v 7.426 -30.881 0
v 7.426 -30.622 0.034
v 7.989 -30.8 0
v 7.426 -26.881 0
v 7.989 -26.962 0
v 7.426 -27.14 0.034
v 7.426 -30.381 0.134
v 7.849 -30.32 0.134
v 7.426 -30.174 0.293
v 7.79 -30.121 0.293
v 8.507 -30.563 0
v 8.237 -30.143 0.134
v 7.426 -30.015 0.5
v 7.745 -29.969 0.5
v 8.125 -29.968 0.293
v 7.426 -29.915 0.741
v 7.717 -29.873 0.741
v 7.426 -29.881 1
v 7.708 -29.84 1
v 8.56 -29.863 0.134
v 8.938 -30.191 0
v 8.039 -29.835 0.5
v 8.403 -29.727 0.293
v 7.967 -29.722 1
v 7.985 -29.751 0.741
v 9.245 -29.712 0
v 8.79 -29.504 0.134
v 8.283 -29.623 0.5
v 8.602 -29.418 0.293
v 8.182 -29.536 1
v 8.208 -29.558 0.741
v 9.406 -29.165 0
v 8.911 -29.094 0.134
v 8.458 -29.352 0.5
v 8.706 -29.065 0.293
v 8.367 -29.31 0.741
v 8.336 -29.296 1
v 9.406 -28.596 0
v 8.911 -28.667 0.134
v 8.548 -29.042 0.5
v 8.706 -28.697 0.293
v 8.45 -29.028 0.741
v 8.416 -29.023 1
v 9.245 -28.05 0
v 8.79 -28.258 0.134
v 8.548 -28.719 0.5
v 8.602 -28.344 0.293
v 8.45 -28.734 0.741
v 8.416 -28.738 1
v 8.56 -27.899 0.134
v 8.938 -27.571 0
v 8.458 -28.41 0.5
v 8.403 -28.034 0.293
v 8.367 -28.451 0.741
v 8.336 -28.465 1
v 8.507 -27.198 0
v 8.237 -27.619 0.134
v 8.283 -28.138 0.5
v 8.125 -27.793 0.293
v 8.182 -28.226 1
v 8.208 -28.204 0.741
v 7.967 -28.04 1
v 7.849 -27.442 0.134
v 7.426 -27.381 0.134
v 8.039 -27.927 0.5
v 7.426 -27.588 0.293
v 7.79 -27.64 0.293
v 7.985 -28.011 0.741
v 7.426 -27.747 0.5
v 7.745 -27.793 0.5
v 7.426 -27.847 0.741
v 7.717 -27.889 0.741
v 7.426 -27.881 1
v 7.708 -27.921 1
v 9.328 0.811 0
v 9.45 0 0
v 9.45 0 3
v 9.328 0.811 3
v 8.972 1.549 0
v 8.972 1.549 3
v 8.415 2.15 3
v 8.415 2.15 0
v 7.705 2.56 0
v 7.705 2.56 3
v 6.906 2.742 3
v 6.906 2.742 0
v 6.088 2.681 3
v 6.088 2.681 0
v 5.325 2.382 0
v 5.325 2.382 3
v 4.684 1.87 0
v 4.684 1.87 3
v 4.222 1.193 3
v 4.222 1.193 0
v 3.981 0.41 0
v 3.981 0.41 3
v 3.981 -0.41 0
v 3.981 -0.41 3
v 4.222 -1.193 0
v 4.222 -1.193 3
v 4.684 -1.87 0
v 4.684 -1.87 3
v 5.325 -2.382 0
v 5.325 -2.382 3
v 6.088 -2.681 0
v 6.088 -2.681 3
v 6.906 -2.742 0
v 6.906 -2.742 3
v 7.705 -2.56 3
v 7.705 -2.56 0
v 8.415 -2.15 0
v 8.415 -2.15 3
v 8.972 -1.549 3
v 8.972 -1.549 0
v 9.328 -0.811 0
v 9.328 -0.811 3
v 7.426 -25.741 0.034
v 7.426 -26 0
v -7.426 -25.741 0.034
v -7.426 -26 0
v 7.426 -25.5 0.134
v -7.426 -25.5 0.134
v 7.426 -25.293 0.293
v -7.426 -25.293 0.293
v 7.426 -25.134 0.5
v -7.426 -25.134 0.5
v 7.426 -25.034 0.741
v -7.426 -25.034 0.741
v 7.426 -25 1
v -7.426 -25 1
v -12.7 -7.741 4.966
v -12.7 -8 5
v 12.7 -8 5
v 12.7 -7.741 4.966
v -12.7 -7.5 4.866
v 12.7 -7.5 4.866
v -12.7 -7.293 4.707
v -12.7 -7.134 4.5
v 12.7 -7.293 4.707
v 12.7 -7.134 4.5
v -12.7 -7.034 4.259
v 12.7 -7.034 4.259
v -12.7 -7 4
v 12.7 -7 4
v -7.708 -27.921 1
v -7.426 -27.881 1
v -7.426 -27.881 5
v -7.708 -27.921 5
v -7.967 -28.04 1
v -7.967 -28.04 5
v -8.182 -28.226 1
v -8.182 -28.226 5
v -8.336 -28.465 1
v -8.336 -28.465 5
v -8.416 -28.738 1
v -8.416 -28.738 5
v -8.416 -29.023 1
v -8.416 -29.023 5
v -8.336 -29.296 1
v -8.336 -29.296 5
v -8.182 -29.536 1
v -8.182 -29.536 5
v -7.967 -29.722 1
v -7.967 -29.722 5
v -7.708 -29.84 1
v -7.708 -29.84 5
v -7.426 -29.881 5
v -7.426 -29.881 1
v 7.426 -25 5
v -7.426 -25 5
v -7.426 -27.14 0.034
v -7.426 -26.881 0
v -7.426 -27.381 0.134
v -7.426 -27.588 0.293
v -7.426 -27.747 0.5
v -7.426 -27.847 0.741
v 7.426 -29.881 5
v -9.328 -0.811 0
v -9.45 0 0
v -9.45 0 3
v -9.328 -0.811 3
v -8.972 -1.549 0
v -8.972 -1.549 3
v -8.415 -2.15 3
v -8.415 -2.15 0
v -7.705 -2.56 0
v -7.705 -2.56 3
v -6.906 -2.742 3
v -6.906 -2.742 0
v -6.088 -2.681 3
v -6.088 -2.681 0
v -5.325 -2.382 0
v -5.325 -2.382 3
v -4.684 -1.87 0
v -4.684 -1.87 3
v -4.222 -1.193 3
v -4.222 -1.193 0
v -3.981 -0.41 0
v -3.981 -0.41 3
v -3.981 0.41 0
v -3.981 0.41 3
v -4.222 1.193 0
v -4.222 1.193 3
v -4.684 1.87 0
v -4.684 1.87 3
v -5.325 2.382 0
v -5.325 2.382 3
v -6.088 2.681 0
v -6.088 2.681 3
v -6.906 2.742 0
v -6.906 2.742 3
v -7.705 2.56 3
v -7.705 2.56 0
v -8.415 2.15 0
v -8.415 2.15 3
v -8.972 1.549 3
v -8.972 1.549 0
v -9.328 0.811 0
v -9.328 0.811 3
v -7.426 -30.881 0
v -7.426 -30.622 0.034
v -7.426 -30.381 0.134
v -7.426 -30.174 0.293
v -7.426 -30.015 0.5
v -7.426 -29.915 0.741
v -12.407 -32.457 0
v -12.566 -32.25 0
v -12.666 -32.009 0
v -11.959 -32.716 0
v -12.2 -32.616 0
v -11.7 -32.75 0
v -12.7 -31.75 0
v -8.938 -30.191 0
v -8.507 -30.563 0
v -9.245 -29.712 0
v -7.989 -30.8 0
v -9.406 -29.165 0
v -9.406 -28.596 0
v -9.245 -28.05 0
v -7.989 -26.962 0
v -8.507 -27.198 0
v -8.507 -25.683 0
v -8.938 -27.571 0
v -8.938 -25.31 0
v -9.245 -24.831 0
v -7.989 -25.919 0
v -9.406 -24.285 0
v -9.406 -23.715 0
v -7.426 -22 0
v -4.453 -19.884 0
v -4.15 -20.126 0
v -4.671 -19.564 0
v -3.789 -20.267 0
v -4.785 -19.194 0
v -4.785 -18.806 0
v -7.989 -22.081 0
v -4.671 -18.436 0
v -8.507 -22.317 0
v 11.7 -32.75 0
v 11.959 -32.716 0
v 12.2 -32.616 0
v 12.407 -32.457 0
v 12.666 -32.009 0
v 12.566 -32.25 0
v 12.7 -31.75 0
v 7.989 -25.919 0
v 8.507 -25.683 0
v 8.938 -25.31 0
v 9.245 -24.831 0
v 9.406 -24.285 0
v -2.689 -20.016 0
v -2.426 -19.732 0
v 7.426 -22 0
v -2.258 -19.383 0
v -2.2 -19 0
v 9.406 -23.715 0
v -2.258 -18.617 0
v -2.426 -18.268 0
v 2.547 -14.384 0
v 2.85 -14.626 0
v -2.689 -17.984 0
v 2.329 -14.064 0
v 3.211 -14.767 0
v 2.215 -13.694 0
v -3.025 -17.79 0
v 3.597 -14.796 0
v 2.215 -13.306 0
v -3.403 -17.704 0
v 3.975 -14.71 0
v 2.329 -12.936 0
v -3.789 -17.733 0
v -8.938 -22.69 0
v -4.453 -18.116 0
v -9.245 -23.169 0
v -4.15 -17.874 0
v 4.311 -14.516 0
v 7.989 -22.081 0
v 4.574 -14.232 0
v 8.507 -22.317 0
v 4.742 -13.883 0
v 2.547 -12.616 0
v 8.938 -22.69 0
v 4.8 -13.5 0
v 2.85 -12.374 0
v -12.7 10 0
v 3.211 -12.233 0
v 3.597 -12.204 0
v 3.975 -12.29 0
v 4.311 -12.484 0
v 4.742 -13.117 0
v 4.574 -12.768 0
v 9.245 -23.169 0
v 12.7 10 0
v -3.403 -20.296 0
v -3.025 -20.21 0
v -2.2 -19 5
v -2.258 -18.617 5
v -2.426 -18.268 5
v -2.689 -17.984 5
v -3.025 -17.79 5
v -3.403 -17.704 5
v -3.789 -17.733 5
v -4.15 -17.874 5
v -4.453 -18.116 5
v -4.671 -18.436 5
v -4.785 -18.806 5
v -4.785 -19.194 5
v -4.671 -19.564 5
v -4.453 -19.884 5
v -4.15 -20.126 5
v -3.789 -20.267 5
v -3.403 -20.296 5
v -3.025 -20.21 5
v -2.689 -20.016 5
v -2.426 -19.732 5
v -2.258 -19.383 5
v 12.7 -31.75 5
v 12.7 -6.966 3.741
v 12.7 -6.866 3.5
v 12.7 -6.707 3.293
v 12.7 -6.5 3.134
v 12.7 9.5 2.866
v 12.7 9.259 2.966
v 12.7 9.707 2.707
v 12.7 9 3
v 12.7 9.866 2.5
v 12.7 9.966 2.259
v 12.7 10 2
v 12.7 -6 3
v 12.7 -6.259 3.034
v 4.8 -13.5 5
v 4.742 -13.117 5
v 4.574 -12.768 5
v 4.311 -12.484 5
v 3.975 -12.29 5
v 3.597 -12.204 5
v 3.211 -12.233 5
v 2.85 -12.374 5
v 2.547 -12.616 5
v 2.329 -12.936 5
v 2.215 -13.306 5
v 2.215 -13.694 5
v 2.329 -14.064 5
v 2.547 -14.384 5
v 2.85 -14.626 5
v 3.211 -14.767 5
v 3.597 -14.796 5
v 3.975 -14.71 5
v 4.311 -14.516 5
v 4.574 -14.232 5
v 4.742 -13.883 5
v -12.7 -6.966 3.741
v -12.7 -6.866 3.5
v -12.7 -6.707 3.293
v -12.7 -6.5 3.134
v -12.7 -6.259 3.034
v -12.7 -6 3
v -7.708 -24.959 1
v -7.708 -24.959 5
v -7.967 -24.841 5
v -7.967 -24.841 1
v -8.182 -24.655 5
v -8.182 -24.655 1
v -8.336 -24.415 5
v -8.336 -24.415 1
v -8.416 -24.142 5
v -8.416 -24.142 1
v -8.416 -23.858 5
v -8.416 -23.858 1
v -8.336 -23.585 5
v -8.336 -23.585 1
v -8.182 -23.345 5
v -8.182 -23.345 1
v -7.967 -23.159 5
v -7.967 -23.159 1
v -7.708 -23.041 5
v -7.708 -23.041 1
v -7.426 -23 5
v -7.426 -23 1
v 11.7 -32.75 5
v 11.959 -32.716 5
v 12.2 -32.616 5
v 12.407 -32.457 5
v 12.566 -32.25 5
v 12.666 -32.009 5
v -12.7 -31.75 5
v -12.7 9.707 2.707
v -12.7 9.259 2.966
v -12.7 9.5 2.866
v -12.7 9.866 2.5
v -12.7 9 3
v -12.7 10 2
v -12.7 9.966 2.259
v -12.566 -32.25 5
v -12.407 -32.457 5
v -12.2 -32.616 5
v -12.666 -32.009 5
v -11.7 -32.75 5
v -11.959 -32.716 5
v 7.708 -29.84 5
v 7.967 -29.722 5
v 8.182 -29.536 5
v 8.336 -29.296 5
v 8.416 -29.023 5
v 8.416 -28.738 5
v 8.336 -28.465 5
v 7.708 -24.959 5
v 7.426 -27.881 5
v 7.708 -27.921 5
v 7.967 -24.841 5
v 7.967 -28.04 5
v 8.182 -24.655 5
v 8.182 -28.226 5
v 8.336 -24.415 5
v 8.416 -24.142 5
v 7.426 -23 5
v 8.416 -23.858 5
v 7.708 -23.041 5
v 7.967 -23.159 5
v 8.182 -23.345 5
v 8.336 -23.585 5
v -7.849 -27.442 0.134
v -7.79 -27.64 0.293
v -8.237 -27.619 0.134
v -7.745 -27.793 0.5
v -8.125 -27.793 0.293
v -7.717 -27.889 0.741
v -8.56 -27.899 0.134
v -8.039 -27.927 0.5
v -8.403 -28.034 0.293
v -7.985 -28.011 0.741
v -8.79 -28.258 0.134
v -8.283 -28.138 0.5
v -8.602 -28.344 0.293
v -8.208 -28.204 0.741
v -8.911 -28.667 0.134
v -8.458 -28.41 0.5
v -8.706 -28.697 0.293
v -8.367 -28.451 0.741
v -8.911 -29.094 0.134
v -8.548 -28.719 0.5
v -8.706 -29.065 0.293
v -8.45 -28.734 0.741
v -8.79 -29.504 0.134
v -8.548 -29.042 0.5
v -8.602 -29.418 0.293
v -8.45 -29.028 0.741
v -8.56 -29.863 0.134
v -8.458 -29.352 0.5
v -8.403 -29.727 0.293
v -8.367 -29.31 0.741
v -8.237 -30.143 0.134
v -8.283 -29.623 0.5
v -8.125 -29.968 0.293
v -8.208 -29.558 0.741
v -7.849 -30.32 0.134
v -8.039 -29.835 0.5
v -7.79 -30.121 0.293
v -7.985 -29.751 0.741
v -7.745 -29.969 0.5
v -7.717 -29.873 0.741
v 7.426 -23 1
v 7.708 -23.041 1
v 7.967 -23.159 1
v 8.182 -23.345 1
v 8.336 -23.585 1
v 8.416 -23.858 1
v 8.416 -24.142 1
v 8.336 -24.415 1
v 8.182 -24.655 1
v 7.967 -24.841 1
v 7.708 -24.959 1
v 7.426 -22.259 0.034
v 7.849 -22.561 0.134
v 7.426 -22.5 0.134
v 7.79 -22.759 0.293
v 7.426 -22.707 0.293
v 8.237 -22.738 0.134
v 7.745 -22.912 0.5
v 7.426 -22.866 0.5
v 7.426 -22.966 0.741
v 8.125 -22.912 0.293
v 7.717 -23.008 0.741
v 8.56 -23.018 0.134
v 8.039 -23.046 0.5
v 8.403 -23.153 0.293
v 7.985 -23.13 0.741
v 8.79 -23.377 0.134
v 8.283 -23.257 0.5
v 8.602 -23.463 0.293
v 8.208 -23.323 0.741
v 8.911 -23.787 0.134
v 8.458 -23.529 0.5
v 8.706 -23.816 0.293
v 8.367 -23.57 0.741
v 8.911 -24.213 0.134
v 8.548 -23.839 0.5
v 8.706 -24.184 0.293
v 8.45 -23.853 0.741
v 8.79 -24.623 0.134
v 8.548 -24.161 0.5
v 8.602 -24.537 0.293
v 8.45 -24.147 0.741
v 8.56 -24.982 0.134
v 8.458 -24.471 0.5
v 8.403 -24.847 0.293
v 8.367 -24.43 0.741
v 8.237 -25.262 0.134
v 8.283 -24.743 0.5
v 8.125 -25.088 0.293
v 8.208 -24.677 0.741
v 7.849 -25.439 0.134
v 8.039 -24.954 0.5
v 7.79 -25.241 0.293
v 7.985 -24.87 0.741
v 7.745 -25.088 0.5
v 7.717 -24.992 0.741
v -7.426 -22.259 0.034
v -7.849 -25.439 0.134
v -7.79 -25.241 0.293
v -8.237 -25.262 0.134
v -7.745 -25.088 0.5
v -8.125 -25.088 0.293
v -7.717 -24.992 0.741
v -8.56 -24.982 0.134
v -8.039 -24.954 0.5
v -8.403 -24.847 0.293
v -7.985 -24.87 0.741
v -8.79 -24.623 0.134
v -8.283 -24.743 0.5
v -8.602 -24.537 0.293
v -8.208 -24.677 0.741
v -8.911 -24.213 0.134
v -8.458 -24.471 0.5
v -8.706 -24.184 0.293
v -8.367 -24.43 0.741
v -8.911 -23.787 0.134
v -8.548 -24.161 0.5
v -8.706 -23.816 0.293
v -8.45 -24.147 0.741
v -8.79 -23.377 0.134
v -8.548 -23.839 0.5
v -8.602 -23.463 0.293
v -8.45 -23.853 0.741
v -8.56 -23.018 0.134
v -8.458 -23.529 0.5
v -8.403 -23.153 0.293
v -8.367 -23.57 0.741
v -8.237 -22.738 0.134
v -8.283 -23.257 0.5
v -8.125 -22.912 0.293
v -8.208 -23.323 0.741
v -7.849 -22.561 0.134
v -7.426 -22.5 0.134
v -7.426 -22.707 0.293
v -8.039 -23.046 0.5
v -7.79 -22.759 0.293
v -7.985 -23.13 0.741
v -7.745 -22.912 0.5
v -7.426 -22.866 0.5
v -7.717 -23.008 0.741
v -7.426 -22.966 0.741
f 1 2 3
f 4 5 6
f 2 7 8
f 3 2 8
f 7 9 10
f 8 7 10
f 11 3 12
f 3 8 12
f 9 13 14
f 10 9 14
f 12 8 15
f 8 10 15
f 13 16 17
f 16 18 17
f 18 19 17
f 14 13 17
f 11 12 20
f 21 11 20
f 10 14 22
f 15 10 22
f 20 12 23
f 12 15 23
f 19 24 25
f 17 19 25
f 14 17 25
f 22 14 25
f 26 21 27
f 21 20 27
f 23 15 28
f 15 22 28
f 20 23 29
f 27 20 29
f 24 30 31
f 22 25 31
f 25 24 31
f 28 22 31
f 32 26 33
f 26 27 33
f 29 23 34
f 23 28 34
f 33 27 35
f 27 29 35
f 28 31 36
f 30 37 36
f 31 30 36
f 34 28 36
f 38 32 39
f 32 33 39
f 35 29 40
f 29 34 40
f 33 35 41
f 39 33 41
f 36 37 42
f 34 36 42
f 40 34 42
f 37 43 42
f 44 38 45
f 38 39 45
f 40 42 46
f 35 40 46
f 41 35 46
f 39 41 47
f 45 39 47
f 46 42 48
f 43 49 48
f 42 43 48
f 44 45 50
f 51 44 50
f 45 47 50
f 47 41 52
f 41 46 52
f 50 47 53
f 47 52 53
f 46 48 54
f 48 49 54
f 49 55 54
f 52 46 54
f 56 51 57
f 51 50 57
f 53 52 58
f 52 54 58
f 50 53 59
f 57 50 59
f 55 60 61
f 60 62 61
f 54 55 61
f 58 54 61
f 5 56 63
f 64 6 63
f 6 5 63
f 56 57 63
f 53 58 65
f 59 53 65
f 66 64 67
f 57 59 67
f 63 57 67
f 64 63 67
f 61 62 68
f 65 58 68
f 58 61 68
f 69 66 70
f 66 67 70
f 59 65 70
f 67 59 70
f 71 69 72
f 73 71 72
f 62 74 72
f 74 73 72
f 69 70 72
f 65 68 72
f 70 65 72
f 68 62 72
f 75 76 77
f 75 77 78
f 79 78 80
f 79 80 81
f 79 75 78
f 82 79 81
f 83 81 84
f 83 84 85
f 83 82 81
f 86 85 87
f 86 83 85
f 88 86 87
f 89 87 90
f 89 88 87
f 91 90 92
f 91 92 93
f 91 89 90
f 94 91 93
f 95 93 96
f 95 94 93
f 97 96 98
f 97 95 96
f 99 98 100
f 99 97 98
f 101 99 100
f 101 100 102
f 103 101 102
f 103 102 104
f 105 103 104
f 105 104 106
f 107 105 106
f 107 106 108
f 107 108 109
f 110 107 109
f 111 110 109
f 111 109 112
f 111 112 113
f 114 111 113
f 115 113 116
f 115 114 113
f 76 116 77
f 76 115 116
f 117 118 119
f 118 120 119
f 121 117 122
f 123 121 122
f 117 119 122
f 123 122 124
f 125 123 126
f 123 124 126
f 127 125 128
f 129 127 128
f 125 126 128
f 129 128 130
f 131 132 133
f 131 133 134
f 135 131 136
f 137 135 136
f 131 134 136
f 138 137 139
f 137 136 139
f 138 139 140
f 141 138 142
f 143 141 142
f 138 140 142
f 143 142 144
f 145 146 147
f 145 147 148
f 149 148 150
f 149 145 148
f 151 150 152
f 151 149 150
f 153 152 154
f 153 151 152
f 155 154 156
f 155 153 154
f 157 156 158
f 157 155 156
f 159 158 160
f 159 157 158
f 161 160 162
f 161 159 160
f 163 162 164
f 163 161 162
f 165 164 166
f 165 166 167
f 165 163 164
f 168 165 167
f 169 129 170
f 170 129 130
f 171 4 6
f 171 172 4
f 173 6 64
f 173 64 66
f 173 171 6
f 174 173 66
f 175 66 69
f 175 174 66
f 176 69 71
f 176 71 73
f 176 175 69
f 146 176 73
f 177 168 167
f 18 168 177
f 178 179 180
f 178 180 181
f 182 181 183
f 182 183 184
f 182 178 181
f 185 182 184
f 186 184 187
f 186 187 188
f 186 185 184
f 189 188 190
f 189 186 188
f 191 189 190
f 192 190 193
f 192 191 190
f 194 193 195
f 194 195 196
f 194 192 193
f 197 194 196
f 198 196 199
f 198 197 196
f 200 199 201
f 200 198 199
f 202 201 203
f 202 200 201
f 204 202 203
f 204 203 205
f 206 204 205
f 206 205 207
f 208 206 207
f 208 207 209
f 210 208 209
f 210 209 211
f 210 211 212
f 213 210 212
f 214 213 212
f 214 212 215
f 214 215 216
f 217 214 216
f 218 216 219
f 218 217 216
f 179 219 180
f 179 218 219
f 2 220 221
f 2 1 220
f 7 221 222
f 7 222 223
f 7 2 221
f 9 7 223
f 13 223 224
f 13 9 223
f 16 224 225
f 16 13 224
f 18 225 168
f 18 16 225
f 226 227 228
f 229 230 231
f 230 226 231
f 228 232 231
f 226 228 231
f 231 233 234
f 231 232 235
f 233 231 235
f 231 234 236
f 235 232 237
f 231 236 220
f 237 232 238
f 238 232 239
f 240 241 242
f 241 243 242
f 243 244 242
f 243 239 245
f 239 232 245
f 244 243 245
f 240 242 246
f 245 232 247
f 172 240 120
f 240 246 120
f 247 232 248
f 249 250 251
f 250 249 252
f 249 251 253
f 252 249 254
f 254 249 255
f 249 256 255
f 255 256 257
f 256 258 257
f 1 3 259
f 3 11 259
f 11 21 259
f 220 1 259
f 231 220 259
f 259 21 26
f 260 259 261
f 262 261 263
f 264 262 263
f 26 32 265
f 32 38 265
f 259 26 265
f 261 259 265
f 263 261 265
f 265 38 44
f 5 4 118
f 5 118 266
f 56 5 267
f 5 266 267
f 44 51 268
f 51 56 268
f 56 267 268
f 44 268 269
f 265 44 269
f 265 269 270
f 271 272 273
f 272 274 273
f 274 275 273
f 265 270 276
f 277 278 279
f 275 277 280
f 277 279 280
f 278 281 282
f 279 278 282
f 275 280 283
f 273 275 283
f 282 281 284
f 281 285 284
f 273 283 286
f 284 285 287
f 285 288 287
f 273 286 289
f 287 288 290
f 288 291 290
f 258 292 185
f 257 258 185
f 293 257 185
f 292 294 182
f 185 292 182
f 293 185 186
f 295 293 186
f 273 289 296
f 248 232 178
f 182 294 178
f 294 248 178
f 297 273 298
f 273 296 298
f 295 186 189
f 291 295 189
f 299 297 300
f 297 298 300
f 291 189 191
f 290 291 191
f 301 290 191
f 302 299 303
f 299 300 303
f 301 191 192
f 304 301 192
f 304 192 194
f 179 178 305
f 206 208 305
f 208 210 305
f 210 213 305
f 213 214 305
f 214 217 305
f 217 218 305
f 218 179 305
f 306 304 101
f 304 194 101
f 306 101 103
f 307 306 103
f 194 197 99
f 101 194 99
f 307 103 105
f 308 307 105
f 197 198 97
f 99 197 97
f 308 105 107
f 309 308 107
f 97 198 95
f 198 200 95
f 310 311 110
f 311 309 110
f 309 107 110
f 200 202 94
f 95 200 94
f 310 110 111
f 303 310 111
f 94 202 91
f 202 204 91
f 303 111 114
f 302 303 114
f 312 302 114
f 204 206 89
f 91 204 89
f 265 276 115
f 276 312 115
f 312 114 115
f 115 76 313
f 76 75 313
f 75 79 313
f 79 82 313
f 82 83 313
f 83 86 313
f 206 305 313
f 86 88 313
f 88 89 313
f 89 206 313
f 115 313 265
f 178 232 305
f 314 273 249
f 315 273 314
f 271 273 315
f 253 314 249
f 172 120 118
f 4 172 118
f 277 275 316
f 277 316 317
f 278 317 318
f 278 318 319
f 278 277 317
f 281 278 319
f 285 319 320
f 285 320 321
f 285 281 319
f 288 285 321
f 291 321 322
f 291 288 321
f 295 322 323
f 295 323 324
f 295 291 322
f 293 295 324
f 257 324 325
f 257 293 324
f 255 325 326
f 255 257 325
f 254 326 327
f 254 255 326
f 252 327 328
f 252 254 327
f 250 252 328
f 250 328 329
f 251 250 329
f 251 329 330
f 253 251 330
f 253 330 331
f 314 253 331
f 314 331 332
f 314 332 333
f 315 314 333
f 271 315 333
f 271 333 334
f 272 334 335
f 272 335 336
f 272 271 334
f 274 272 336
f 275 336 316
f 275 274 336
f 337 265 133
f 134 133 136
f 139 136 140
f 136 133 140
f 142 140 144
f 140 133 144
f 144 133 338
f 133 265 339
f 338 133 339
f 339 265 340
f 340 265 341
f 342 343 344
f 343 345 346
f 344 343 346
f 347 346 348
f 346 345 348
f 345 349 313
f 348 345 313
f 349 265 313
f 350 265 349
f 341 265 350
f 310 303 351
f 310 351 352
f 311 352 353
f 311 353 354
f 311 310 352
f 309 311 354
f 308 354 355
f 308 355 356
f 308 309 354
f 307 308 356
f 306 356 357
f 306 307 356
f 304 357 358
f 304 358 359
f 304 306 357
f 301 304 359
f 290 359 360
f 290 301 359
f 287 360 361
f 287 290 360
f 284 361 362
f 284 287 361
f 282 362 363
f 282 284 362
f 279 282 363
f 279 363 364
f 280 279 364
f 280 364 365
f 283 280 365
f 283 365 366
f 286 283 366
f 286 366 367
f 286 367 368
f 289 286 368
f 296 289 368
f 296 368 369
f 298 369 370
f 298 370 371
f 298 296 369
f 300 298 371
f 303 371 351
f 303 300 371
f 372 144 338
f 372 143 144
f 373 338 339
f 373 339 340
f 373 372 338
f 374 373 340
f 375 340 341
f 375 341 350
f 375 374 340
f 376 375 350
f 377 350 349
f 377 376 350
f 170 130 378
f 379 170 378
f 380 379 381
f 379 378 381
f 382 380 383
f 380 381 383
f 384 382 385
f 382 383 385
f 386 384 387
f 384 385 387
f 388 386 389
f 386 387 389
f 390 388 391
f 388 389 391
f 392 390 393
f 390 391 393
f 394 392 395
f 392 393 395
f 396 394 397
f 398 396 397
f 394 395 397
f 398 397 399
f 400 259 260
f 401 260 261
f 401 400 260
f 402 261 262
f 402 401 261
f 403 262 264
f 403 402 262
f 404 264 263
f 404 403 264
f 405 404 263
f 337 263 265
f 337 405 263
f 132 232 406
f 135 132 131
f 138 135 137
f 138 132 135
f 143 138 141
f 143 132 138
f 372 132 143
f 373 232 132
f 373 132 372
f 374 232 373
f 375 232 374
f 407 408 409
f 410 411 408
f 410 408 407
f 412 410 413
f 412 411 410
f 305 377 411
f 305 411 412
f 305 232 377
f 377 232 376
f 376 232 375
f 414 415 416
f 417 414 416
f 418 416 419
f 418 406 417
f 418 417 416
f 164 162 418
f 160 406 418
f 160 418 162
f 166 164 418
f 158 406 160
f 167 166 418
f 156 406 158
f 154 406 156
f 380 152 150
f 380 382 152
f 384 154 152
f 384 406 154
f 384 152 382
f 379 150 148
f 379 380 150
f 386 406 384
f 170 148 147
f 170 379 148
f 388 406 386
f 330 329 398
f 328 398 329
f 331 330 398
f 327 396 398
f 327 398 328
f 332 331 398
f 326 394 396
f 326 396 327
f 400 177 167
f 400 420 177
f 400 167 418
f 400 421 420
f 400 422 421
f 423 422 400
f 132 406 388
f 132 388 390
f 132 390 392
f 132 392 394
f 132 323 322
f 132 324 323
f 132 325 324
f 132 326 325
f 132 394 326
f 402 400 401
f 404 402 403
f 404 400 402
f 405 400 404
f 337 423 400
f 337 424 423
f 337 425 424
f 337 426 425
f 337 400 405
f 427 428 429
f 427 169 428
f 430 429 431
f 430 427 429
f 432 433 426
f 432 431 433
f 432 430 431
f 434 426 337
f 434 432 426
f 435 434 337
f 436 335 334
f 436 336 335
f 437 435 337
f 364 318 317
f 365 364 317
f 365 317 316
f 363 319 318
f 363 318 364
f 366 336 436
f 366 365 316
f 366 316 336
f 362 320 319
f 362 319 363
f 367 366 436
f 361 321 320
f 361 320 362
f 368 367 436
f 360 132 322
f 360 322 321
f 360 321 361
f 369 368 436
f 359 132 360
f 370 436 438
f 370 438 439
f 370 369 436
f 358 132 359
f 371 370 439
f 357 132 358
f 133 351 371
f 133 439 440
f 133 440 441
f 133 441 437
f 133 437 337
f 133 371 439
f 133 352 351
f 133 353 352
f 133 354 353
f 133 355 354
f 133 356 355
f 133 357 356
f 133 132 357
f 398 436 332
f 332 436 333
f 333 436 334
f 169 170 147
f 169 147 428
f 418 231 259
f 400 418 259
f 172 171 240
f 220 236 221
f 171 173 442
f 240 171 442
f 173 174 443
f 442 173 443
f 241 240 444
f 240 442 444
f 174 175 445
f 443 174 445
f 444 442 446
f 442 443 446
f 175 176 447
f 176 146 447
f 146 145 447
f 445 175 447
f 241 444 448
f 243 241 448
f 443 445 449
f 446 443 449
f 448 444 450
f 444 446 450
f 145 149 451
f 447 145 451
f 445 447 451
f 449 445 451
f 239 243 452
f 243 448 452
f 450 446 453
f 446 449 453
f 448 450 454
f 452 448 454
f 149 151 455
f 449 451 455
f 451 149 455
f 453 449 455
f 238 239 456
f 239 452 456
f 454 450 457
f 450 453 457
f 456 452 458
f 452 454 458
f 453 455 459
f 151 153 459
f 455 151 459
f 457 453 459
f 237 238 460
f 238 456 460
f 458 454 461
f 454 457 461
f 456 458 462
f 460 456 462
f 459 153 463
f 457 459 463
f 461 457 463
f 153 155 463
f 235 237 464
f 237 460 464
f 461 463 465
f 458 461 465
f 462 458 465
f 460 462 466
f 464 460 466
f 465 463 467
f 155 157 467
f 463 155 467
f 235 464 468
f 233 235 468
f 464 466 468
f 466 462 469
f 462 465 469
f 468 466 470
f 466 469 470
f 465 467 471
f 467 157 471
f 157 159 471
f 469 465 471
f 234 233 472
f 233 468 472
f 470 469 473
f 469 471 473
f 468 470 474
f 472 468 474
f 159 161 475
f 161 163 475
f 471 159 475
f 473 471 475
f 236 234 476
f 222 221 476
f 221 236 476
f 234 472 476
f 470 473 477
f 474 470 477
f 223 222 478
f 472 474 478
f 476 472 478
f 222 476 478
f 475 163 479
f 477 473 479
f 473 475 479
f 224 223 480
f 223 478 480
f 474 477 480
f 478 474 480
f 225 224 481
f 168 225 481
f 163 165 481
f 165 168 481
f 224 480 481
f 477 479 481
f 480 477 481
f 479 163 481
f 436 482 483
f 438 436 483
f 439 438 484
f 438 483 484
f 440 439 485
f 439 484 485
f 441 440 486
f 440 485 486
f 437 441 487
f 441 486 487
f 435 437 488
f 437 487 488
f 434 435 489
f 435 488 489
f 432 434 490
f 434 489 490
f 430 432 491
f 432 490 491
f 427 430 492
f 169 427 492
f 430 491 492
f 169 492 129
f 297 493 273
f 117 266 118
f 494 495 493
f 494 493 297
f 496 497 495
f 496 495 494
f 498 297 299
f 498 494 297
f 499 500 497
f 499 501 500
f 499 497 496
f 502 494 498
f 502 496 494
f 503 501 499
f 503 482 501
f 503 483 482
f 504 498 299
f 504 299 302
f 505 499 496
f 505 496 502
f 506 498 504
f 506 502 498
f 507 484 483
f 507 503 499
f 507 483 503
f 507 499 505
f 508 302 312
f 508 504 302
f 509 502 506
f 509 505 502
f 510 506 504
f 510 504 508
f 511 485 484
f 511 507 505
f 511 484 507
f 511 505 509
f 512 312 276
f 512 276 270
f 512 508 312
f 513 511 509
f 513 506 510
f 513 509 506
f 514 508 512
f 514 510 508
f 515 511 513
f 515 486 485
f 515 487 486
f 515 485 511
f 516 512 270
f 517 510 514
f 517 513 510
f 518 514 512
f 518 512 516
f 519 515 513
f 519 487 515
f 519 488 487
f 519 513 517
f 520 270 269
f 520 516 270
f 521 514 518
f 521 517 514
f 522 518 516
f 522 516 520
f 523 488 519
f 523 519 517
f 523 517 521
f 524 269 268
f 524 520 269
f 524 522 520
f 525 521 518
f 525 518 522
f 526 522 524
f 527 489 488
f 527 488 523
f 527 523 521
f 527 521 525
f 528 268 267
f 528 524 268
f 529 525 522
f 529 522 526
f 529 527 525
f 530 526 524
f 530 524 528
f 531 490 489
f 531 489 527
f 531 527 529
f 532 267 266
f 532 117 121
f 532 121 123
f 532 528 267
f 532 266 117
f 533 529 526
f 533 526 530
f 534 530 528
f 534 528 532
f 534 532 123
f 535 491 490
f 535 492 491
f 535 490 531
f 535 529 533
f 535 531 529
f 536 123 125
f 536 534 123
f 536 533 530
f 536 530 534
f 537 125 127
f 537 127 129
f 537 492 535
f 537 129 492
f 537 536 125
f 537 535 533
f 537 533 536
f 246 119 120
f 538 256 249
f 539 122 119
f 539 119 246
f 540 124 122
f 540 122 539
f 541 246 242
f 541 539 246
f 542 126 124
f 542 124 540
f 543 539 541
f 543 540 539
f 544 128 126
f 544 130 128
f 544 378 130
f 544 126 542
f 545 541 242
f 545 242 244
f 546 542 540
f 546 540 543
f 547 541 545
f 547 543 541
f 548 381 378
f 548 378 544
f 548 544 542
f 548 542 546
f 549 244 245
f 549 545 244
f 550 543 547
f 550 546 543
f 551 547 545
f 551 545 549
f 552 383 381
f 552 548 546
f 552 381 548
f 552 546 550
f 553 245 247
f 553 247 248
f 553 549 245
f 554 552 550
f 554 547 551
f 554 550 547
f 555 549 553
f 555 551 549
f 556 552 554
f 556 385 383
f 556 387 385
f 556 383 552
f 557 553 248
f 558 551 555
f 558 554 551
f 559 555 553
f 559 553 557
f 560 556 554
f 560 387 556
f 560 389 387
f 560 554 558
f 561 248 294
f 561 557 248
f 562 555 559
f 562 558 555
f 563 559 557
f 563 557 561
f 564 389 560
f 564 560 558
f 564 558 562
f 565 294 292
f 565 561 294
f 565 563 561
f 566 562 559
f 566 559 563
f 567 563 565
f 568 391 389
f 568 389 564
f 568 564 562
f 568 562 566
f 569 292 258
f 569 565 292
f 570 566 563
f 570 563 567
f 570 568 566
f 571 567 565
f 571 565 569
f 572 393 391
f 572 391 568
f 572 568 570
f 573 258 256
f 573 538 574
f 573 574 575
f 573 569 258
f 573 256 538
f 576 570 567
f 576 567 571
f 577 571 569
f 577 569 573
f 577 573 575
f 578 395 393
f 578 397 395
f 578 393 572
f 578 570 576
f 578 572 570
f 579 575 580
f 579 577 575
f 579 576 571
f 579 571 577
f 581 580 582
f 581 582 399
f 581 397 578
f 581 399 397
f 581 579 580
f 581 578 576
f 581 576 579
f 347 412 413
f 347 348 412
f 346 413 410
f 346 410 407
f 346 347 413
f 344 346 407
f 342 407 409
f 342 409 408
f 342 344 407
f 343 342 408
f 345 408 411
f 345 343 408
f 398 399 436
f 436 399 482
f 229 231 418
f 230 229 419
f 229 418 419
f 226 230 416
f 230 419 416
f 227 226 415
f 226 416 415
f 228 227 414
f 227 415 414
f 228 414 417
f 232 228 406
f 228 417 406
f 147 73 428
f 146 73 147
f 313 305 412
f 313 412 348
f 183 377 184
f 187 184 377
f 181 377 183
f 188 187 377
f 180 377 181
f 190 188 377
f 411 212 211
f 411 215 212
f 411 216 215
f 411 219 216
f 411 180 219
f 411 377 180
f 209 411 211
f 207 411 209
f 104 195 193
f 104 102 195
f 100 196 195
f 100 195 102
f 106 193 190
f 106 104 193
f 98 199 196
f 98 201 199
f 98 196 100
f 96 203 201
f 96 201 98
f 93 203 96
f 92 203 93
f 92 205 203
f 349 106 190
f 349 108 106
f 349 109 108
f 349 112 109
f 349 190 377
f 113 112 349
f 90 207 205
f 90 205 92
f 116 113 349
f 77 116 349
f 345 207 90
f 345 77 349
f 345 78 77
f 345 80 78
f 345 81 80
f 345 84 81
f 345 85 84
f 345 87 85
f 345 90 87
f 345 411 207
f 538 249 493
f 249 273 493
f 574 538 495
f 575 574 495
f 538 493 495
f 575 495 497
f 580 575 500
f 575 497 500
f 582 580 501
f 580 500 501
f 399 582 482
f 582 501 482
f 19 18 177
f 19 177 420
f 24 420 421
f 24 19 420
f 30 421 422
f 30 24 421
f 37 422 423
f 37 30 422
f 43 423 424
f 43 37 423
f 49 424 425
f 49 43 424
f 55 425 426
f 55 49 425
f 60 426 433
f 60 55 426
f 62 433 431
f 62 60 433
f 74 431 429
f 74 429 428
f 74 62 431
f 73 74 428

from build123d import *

# Parameters (mm, degrees)
SKETCH1_W           = 25.4
SKETCH1_H           = 20
SKETCH1_R           = 2.75
BOSS_EXTRUDE1_DEPTH = 3
SKETCH2_W           = 25.4
SKETCH2_H           = 25.75
SKETCH2_R           = 1.3
BOSS_EXTRUDE2_DEPTH = 5
FILLET1_R           = 1
FILLET2_R           = 1


with BuildPart() as part:
    # Sketch1 → Boss-Extrude1 (new body)
    with BuildSketch(Plane.XY):
        Rectangle(SKETCH1_W, SKETCH1_H)
        with Locations((6.7, 0)):
            Circle(SKETCH1_R, mode=Mode.SUBTRACT)
        with Locations(Location((-6.7, 0, 0), (0, 0, 180))):
            Circle(SKETCH1_R, mode=Mode.SUBTRACT)
    extrude(amount=BOSS_EXTRUDE1_DEPTH)

    # Sketch2 → Boss-Extrude2 (add)
    with BuildSketch(Plane.XY):
        with Locations((0, -19.875)):
            Rectangle(SKETCH2_W, SKETCH2_H)
        with Locations((-3.5, -19)):
            Circle(SKETCH2_R, mode=Mode.SUBTRACT)
        with Locations((3.5, -13.5)):
            Circle(SKETCH2_R, mode=Mode.SUBTRACT)
        with BuildLine():
            Line((-7.426009093, -23), (7.426009093, -23))
            ThreePointArc((7.426009093, -23), (8.426009093, -24), (7.426009093, -25))
            Line((7.426009093, -25), (-7.426009093, -25))
            ThreePointArc((-7.426009093, -25), (-8.426009093, -24), (-7.426009093, -23))
        make_face(mode=Mode.SUBTRACT)
        with BuildLine():
            Line((-7.426009093, -29.880803462), (7.426009093, -29.880803462))
            ThreePointArc((7.426009093, -29.880803462), (8.426009093, -28.880803462), (7.426009093, -27.880803462))
            Line((7.426009093, -27.880803462), (-7.426009093, -27.880803462))
            ThreePointArc((-7.426009093, -27.880803462), (-8.426009093, -28.880803462), (-7.426009093, -29.880803462))
        make_face(mode=Mode.SUBTRACT)
    extrude(amount=BOSS_EXTRUDE2_DEPTH)

    # Fillet1
    fillet1_edges = [part.edges().sort_by_distance(p)[0] for p in [
        (-8.426009093, -24, 0),
        (0, -25, 0),
        (8.426009093, -24, 0),
        (0, -23, 0),
        (-8.426009093, -28.880803462, 0),
        (0, -29.880803462, 0),
        (8.426009093, -28.880803462, 0),
        (0, -27.880803462, 0),
    ]]
    fillet(fillet1_edges, radius=FILLET1_R)

    # Fillet2
    fillet2_edges = [part.edges().sort_by_distance(p)[0] for p in [
        (0, 10, 3),
        (0, -7, 5),
        (0, -7, 3),
        (12.7, -32.75, 2.5),
        (-12.7, -32.75, 2.5),
    ]]
    fillet(fillet2_edges, radius=FILLET2_R - 0.0001)  # a hair under: the kernel refuses the full size


solid = part.part
